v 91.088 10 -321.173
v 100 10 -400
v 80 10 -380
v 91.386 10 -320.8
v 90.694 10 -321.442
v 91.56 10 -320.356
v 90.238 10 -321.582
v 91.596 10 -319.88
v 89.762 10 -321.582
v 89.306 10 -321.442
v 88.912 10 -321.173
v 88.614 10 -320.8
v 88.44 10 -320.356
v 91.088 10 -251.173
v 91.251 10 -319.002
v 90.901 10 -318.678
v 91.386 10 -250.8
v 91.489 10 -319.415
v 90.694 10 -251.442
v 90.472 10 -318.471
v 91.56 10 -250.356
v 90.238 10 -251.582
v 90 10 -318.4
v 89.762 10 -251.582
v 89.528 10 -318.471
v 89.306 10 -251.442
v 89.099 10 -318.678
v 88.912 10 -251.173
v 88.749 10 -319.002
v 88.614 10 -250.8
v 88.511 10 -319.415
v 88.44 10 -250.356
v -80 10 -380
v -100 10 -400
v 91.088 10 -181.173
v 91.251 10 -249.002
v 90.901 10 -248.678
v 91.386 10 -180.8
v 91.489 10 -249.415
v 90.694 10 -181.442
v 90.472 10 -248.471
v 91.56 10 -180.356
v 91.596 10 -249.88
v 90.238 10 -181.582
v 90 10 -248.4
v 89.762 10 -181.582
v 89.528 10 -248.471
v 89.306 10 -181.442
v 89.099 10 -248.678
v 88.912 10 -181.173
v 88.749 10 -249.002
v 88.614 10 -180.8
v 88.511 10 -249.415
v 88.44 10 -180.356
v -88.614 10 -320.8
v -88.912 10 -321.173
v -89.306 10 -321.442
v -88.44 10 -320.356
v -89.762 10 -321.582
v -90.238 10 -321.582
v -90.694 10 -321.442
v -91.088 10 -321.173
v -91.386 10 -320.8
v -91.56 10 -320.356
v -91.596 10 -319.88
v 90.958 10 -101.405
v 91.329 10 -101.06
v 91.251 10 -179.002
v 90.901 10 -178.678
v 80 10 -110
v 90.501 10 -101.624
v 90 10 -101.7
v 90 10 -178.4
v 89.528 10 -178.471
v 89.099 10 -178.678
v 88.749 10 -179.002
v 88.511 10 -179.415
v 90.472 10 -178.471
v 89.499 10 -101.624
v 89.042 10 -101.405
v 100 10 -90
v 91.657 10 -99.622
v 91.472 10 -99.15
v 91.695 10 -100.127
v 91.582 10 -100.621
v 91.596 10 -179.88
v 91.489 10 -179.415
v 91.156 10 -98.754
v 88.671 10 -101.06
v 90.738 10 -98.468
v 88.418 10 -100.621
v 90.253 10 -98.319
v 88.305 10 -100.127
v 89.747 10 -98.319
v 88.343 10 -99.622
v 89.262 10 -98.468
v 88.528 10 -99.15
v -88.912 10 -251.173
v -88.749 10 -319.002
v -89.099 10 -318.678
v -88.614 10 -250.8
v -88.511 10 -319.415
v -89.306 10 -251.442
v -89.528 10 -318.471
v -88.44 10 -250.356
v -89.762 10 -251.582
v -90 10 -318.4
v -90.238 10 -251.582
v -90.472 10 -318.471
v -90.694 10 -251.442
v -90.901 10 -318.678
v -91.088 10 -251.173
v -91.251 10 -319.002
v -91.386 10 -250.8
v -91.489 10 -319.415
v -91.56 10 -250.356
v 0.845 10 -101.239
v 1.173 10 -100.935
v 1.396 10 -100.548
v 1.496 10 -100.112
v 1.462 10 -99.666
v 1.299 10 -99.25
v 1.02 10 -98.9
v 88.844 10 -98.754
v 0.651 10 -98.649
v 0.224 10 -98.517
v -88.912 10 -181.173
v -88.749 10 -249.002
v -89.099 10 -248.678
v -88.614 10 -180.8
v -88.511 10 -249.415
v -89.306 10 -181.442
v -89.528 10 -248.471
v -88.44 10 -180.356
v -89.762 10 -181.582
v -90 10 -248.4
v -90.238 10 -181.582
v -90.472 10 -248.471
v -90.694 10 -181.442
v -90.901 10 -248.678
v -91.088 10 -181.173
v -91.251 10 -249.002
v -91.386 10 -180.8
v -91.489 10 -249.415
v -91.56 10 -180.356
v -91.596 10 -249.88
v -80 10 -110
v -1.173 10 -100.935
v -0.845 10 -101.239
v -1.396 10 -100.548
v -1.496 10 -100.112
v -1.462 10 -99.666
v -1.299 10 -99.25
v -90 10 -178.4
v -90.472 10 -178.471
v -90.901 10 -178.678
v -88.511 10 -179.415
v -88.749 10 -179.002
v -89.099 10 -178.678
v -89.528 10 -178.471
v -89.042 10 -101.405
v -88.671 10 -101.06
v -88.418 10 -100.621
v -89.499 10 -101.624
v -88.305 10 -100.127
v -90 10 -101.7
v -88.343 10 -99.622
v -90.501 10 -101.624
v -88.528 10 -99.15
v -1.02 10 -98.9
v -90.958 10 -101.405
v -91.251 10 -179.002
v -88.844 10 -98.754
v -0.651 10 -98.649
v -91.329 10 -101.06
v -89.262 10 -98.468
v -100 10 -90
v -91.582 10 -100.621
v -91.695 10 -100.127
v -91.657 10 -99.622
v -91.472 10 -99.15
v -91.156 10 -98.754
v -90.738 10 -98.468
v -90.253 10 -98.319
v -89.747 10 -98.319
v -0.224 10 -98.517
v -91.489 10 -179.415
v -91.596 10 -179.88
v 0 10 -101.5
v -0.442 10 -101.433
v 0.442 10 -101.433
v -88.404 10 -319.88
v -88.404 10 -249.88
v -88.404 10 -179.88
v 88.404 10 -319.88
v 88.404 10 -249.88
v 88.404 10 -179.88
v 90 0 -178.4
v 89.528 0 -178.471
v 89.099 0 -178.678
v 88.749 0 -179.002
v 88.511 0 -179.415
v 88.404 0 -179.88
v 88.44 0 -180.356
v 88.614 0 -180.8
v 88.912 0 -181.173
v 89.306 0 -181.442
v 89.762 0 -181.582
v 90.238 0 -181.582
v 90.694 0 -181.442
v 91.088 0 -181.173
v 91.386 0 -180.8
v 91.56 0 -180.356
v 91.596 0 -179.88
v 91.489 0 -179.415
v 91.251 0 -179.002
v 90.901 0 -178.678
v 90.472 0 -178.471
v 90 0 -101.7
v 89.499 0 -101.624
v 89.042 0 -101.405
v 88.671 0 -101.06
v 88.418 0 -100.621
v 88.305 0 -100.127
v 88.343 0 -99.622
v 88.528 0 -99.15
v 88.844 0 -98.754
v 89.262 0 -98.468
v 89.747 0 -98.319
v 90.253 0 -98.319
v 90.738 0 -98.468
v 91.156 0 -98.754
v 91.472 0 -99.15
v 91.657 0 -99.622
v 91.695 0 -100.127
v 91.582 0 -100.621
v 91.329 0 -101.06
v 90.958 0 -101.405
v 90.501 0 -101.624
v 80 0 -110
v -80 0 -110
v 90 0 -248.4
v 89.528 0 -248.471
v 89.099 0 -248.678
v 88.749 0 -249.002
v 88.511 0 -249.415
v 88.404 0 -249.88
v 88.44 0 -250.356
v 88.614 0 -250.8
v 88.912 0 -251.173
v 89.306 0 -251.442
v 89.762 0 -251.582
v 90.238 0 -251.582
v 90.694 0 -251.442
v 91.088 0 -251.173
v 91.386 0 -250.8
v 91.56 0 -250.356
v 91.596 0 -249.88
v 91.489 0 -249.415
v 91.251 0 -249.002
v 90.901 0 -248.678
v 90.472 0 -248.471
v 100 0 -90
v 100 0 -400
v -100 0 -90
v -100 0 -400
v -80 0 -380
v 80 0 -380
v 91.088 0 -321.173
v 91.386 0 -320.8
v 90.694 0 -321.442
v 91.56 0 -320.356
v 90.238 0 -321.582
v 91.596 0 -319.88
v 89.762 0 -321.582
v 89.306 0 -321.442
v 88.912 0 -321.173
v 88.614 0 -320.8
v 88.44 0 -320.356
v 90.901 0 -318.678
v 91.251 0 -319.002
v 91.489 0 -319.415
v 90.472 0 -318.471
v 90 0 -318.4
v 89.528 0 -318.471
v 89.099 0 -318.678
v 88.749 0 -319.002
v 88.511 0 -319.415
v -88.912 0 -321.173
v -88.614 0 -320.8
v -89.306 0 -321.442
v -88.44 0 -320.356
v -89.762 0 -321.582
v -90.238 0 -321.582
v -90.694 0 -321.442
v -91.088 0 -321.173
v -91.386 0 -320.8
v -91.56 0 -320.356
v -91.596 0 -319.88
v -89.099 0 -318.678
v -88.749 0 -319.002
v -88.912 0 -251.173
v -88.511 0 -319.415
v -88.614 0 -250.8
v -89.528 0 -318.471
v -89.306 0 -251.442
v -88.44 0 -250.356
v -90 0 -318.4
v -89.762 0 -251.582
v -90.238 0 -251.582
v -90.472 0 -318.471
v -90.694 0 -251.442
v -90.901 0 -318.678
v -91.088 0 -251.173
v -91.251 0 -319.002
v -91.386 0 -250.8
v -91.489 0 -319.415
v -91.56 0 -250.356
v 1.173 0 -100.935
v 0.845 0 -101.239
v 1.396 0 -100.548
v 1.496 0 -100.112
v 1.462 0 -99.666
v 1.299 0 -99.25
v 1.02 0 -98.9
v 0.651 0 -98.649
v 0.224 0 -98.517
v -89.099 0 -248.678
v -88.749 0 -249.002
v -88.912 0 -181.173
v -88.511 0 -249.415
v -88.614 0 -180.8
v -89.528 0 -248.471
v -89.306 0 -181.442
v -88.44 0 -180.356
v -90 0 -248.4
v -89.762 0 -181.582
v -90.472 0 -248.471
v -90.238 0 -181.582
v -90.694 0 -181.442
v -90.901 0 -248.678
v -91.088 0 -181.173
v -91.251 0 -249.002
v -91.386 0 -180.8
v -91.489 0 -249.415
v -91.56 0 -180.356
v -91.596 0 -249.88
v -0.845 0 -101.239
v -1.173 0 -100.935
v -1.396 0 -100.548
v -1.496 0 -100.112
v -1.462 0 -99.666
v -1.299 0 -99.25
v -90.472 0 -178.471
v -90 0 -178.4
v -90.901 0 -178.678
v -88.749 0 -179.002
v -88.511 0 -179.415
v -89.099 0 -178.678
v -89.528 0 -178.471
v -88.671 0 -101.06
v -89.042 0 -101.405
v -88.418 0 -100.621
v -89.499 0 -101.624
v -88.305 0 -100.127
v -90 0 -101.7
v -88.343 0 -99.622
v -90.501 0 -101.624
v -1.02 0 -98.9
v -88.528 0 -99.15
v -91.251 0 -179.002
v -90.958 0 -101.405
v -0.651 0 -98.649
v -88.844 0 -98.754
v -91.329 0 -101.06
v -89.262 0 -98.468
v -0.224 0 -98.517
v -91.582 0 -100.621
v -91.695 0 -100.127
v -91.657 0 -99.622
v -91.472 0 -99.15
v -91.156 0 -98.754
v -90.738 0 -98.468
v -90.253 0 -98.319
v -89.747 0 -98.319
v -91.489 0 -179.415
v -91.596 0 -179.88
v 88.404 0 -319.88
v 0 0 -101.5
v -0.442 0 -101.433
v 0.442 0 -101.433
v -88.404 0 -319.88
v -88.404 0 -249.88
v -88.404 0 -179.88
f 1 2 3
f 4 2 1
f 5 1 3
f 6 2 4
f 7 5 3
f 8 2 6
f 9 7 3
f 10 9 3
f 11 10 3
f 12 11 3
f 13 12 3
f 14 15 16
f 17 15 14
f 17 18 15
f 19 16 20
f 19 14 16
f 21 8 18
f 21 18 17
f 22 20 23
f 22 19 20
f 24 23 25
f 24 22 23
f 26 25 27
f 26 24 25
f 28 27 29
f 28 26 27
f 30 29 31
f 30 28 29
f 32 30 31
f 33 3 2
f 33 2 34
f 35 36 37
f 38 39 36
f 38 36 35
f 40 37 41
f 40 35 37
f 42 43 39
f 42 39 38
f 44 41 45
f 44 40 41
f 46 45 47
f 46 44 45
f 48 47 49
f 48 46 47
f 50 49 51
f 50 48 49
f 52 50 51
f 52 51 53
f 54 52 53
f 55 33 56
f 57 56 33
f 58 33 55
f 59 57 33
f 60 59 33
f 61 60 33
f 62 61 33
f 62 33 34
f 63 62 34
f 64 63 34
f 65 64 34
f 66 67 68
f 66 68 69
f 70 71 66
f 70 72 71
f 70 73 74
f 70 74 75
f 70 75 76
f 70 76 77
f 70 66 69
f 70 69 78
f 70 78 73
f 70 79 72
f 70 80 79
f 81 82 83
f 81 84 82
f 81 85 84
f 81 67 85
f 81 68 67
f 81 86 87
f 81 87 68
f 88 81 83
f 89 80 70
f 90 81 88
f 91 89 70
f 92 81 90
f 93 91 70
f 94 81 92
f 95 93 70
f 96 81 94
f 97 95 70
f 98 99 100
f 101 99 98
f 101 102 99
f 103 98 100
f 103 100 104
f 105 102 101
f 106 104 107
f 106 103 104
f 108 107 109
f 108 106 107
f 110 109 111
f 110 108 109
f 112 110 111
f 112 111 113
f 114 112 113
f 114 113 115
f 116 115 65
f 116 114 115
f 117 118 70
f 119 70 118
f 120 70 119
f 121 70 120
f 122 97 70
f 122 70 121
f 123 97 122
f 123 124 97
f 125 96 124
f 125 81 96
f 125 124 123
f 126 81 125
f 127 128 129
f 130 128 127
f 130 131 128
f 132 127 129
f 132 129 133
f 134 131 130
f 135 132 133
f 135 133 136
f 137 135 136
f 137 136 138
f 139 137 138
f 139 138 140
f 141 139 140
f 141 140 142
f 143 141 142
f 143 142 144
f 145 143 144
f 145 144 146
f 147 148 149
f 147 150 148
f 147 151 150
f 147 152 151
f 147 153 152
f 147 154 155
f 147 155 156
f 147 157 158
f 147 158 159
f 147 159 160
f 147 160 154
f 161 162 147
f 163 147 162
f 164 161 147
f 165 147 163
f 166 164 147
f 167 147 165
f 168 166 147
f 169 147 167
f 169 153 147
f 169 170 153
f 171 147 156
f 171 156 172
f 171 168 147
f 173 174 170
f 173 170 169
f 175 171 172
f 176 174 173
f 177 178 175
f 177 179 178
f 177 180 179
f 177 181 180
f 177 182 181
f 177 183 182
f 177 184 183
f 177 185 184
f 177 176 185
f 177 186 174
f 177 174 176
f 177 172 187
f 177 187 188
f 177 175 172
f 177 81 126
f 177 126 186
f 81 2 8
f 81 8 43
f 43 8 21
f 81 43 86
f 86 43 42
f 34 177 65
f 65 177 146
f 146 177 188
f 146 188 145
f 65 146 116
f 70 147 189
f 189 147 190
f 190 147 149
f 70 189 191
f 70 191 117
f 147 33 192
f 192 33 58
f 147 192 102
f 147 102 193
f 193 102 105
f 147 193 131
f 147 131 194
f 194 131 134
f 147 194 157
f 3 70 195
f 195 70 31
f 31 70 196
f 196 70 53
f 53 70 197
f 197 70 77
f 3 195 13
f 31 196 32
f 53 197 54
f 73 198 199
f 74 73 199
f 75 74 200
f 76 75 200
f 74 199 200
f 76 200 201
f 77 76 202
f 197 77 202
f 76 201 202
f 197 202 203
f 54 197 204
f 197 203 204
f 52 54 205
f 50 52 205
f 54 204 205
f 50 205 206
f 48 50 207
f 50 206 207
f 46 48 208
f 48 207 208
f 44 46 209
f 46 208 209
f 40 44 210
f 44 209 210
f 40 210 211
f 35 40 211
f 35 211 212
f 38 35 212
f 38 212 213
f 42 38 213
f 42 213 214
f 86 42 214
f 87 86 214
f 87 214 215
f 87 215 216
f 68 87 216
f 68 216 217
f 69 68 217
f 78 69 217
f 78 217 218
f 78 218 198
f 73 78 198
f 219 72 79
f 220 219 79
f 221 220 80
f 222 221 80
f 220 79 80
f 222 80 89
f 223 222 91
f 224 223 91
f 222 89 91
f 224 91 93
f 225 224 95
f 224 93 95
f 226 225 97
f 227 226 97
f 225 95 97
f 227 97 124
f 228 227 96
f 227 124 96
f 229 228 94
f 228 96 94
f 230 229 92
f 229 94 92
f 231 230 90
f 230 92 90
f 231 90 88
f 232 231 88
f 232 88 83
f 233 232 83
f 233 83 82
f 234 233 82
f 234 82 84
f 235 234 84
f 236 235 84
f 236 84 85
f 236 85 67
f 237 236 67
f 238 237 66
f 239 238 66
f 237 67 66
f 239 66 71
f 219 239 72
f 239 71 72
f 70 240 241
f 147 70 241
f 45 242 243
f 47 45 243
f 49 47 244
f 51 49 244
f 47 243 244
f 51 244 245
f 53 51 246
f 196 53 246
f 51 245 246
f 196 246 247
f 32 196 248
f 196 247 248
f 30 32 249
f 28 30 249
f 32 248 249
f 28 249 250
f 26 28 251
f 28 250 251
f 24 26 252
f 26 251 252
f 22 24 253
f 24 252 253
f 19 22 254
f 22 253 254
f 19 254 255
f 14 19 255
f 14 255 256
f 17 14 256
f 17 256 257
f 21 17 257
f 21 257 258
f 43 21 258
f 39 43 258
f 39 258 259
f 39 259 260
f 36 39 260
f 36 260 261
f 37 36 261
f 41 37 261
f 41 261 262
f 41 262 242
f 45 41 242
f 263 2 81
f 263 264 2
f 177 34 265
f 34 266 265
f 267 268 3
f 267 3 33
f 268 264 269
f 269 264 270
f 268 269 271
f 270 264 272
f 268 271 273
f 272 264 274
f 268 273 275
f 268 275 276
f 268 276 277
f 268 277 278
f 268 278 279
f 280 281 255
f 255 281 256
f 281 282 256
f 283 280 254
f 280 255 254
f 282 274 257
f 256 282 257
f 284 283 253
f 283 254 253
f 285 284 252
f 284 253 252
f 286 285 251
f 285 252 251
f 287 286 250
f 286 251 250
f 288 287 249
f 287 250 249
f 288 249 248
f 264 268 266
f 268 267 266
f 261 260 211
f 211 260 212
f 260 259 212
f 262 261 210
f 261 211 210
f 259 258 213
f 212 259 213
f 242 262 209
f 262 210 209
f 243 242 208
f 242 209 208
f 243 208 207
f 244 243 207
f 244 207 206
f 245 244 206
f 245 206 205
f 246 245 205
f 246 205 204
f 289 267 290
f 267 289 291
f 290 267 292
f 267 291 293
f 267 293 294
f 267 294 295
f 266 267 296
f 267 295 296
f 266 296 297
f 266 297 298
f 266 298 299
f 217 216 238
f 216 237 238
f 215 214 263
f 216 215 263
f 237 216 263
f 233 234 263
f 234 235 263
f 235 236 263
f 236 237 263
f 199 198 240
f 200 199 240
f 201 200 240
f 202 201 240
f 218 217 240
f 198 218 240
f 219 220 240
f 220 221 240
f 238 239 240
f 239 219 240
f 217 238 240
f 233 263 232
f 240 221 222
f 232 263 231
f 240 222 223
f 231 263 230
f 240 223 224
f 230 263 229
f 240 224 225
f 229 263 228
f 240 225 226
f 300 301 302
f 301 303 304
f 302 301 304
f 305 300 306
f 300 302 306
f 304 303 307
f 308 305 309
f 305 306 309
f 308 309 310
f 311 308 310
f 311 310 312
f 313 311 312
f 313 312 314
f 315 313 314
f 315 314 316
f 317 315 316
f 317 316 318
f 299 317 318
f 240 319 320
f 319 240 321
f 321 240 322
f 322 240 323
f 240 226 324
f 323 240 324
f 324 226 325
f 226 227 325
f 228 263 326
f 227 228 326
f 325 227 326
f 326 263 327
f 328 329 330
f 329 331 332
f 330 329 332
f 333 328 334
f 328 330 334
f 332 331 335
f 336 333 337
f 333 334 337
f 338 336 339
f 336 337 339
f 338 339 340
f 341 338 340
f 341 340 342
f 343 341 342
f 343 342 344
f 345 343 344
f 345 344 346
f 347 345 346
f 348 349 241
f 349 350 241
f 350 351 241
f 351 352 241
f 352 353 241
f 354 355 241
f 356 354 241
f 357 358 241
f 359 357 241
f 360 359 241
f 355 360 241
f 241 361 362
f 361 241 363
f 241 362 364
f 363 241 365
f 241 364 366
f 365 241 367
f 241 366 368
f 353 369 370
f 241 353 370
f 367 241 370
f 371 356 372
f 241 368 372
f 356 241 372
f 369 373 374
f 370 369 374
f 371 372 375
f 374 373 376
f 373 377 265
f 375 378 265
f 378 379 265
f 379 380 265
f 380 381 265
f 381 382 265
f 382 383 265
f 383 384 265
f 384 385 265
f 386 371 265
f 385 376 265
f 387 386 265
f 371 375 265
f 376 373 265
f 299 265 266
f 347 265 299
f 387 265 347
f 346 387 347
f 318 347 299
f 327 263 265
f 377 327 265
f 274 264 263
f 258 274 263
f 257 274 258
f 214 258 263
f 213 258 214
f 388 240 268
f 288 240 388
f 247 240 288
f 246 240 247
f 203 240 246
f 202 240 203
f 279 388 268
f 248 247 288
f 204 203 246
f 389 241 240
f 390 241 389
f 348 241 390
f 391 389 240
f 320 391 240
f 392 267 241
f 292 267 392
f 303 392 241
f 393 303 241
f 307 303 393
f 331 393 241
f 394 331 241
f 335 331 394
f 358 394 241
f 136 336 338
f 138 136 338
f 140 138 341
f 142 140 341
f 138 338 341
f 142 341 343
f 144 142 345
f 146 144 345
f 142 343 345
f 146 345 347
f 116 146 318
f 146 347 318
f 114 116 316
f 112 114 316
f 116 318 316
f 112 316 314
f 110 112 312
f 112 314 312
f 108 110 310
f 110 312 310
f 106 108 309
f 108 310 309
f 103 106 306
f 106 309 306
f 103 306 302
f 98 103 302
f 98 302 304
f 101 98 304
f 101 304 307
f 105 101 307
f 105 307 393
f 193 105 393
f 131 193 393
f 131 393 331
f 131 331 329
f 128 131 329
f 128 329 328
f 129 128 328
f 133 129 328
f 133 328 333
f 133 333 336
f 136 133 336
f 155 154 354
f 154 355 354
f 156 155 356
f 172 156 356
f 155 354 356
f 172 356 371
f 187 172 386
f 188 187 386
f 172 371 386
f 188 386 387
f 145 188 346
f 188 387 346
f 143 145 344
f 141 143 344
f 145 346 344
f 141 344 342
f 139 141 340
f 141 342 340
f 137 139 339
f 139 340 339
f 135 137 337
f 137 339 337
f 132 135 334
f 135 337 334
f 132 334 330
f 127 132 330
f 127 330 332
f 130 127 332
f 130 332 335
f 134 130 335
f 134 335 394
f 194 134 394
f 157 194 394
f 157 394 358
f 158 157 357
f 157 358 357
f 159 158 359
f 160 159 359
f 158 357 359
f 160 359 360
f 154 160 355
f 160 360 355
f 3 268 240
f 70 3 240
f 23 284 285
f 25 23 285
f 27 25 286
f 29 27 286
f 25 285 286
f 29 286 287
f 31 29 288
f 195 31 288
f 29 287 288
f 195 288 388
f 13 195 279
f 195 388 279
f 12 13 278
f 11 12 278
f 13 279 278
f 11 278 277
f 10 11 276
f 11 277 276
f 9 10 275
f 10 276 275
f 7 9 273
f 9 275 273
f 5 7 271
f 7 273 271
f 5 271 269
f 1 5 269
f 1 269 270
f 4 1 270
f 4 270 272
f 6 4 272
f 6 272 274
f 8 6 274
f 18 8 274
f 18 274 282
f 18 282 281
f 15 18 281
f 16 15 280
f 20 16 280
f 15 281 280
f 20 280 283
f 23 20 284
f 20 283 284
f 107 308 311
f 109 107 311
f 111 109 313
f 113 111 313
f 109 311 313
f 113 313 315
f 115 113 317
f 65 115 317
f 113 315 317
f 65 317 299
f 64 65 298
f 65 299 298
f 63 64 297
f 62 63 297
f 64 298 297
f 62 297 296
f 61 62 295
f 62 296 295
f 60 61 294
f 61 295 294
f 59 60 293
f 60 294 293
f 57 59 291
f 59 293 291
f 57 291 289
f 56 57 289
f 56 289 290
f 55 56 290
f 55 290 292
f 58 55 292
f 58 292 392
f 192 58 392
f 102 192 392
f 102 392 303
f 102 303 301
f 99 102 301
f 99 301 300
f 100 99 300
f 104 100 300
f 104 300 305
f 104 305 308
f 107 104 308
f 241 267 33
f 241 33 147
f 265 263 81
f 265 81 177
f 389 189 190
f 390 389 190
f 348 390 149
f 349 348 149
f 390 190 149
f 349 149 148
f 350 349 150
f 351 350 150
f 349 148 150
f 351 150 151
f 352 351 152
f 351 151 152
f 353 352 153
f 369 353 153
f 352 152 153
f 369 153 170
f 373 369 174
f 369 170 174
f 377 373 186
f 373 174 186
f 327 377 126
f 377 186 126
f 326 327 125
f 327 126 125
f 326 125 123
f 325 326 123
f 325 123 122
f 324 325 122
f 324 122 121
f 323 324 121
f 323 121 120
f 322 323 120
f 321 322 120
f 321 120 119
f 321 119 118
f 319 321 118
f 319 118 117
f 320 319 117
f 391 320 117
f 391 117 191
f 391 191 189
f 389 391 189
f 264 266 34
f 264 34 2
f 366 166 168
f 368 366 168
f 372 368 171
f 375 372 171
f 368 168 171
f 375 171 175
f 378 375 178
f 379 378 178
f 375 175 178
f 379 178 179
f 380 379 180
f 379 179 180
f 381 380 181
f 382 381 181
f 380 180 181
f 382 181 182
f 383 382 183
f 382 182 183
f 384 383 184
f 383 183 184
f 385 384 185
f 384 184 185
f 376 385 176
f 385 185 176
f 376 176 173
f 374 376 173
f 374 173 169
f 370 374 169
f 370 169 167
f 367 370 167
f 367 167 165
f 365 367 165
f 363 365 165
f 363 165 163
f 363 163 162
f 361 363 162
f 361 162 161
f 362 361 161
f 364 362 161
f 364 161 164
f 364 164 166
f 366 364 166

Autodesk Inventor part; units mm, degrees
ref_plane "YZ Plane" through (0, 0, 0) normal (1, 0, 0) x (0, 1, 0)
ref_plane "XZ Plane" through (0, 0, 0) normal (0, 1, 0) x (-1, 0, 0)
ref_plane "XY Plane" through (0, 0, 0) normal (0, 0, 1) x (1, 0, 0)
sketch "Sketch1" plane through (0, 0, 0) normal (0, 1, 0) x (-1, 0, 0)
  line L0 (100, -400) -> (-100, -400)
  line L1 (-100, -400) -> (-100, -110)
  line L2 (-100, -110) -> (100, -110)
  line L3 (100, -400) -> (100, -110)
  line L4 (100, -110) -> (100, -400)
  line L5 (-100, -90) -> (100, -90)
  line L6 (100, -110) -> (100, -90)
  line L7 (-100, -110) -> (-100, -90)
  line L8 (-80, -390) -> (-80, -110)
  line L9 (80, -390) -> (80, -110)
  line L10 (-80, -380) -> (80, -380)
  point P0 (0, -100)
  point P1 (90, -100)
  point P2 (-90, -100)
  dimension "d126" = 160
  dimension "d160" = 290
extrude "Extrusion1" add sketch "Sketch1" along normal blind 10 contours L0 L1 L2 L8 L10 L9 L3 | L2 L7 L5 L6
sketch "Sketch12" plane through (0, 10, 0) normal (0, 1, 0) x (1, 0, 0)
  line L0 (90, 400) -> (90, 320)
  line L1 (90, 320) -> (90, 250)
  line L2 (90, 250) -> (90, 180)
  point P0 (0, 0)
  dimension "d132" = 80
  dimension "d134" = 70
  dimension "d135" = 70
hole "Hole9" at (90, 10, -320) at (90, 10, -250) at (90, 10, -180) direction (0, -1, 0) diameter 3.2 end through all clearance for "Socket Head Cap Screw ISO 4762" size "M3" standard "ISO"
pattern_linear "Rectangular Pattern1" count 2 spacing 180 along (-1, 0, 0) of "Hole9"
hole "Hole12" at (90, 0, -100) at (-90, 0, -100) direction (0, 1, 0) diameter 3.4 end through all clearance for "Socket Head Cap Screw ISO 4762" size "M3" standard "ISO"
hole "Hole13" at (0, 0, -100) direction (0, 1, 0) diameter 3 end through all
properties part number "Aufhängung_Seitenteil_Koppeltest_außen"
